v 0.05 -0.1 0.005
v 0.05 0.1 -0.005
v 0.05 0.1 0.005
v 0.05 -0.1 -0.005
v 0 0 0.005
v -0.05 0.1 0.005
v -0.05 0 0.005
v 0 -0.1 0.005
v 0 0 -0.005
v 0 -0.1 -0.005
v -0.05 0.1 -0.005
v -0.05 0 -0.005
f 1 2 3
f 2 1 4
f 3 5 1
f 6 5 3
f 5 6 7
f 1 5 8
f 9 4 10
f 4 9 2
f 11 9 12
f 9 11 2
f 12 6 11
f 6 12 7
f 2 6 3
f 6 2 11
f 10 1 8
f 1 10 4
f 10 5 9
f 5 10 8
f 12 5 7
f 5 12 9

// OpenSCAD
module l_shaped_bracket() {
    difference() {
        // Main block
        cube([0.1, 0.2, 0.01], center = true);
        // Cutout for the L-shape
        translate([-0.05, -0.1, -0.005])
            cube([0.05, 0.1, 0.01], center = false);
    }
}

l_shaped_bracket();
